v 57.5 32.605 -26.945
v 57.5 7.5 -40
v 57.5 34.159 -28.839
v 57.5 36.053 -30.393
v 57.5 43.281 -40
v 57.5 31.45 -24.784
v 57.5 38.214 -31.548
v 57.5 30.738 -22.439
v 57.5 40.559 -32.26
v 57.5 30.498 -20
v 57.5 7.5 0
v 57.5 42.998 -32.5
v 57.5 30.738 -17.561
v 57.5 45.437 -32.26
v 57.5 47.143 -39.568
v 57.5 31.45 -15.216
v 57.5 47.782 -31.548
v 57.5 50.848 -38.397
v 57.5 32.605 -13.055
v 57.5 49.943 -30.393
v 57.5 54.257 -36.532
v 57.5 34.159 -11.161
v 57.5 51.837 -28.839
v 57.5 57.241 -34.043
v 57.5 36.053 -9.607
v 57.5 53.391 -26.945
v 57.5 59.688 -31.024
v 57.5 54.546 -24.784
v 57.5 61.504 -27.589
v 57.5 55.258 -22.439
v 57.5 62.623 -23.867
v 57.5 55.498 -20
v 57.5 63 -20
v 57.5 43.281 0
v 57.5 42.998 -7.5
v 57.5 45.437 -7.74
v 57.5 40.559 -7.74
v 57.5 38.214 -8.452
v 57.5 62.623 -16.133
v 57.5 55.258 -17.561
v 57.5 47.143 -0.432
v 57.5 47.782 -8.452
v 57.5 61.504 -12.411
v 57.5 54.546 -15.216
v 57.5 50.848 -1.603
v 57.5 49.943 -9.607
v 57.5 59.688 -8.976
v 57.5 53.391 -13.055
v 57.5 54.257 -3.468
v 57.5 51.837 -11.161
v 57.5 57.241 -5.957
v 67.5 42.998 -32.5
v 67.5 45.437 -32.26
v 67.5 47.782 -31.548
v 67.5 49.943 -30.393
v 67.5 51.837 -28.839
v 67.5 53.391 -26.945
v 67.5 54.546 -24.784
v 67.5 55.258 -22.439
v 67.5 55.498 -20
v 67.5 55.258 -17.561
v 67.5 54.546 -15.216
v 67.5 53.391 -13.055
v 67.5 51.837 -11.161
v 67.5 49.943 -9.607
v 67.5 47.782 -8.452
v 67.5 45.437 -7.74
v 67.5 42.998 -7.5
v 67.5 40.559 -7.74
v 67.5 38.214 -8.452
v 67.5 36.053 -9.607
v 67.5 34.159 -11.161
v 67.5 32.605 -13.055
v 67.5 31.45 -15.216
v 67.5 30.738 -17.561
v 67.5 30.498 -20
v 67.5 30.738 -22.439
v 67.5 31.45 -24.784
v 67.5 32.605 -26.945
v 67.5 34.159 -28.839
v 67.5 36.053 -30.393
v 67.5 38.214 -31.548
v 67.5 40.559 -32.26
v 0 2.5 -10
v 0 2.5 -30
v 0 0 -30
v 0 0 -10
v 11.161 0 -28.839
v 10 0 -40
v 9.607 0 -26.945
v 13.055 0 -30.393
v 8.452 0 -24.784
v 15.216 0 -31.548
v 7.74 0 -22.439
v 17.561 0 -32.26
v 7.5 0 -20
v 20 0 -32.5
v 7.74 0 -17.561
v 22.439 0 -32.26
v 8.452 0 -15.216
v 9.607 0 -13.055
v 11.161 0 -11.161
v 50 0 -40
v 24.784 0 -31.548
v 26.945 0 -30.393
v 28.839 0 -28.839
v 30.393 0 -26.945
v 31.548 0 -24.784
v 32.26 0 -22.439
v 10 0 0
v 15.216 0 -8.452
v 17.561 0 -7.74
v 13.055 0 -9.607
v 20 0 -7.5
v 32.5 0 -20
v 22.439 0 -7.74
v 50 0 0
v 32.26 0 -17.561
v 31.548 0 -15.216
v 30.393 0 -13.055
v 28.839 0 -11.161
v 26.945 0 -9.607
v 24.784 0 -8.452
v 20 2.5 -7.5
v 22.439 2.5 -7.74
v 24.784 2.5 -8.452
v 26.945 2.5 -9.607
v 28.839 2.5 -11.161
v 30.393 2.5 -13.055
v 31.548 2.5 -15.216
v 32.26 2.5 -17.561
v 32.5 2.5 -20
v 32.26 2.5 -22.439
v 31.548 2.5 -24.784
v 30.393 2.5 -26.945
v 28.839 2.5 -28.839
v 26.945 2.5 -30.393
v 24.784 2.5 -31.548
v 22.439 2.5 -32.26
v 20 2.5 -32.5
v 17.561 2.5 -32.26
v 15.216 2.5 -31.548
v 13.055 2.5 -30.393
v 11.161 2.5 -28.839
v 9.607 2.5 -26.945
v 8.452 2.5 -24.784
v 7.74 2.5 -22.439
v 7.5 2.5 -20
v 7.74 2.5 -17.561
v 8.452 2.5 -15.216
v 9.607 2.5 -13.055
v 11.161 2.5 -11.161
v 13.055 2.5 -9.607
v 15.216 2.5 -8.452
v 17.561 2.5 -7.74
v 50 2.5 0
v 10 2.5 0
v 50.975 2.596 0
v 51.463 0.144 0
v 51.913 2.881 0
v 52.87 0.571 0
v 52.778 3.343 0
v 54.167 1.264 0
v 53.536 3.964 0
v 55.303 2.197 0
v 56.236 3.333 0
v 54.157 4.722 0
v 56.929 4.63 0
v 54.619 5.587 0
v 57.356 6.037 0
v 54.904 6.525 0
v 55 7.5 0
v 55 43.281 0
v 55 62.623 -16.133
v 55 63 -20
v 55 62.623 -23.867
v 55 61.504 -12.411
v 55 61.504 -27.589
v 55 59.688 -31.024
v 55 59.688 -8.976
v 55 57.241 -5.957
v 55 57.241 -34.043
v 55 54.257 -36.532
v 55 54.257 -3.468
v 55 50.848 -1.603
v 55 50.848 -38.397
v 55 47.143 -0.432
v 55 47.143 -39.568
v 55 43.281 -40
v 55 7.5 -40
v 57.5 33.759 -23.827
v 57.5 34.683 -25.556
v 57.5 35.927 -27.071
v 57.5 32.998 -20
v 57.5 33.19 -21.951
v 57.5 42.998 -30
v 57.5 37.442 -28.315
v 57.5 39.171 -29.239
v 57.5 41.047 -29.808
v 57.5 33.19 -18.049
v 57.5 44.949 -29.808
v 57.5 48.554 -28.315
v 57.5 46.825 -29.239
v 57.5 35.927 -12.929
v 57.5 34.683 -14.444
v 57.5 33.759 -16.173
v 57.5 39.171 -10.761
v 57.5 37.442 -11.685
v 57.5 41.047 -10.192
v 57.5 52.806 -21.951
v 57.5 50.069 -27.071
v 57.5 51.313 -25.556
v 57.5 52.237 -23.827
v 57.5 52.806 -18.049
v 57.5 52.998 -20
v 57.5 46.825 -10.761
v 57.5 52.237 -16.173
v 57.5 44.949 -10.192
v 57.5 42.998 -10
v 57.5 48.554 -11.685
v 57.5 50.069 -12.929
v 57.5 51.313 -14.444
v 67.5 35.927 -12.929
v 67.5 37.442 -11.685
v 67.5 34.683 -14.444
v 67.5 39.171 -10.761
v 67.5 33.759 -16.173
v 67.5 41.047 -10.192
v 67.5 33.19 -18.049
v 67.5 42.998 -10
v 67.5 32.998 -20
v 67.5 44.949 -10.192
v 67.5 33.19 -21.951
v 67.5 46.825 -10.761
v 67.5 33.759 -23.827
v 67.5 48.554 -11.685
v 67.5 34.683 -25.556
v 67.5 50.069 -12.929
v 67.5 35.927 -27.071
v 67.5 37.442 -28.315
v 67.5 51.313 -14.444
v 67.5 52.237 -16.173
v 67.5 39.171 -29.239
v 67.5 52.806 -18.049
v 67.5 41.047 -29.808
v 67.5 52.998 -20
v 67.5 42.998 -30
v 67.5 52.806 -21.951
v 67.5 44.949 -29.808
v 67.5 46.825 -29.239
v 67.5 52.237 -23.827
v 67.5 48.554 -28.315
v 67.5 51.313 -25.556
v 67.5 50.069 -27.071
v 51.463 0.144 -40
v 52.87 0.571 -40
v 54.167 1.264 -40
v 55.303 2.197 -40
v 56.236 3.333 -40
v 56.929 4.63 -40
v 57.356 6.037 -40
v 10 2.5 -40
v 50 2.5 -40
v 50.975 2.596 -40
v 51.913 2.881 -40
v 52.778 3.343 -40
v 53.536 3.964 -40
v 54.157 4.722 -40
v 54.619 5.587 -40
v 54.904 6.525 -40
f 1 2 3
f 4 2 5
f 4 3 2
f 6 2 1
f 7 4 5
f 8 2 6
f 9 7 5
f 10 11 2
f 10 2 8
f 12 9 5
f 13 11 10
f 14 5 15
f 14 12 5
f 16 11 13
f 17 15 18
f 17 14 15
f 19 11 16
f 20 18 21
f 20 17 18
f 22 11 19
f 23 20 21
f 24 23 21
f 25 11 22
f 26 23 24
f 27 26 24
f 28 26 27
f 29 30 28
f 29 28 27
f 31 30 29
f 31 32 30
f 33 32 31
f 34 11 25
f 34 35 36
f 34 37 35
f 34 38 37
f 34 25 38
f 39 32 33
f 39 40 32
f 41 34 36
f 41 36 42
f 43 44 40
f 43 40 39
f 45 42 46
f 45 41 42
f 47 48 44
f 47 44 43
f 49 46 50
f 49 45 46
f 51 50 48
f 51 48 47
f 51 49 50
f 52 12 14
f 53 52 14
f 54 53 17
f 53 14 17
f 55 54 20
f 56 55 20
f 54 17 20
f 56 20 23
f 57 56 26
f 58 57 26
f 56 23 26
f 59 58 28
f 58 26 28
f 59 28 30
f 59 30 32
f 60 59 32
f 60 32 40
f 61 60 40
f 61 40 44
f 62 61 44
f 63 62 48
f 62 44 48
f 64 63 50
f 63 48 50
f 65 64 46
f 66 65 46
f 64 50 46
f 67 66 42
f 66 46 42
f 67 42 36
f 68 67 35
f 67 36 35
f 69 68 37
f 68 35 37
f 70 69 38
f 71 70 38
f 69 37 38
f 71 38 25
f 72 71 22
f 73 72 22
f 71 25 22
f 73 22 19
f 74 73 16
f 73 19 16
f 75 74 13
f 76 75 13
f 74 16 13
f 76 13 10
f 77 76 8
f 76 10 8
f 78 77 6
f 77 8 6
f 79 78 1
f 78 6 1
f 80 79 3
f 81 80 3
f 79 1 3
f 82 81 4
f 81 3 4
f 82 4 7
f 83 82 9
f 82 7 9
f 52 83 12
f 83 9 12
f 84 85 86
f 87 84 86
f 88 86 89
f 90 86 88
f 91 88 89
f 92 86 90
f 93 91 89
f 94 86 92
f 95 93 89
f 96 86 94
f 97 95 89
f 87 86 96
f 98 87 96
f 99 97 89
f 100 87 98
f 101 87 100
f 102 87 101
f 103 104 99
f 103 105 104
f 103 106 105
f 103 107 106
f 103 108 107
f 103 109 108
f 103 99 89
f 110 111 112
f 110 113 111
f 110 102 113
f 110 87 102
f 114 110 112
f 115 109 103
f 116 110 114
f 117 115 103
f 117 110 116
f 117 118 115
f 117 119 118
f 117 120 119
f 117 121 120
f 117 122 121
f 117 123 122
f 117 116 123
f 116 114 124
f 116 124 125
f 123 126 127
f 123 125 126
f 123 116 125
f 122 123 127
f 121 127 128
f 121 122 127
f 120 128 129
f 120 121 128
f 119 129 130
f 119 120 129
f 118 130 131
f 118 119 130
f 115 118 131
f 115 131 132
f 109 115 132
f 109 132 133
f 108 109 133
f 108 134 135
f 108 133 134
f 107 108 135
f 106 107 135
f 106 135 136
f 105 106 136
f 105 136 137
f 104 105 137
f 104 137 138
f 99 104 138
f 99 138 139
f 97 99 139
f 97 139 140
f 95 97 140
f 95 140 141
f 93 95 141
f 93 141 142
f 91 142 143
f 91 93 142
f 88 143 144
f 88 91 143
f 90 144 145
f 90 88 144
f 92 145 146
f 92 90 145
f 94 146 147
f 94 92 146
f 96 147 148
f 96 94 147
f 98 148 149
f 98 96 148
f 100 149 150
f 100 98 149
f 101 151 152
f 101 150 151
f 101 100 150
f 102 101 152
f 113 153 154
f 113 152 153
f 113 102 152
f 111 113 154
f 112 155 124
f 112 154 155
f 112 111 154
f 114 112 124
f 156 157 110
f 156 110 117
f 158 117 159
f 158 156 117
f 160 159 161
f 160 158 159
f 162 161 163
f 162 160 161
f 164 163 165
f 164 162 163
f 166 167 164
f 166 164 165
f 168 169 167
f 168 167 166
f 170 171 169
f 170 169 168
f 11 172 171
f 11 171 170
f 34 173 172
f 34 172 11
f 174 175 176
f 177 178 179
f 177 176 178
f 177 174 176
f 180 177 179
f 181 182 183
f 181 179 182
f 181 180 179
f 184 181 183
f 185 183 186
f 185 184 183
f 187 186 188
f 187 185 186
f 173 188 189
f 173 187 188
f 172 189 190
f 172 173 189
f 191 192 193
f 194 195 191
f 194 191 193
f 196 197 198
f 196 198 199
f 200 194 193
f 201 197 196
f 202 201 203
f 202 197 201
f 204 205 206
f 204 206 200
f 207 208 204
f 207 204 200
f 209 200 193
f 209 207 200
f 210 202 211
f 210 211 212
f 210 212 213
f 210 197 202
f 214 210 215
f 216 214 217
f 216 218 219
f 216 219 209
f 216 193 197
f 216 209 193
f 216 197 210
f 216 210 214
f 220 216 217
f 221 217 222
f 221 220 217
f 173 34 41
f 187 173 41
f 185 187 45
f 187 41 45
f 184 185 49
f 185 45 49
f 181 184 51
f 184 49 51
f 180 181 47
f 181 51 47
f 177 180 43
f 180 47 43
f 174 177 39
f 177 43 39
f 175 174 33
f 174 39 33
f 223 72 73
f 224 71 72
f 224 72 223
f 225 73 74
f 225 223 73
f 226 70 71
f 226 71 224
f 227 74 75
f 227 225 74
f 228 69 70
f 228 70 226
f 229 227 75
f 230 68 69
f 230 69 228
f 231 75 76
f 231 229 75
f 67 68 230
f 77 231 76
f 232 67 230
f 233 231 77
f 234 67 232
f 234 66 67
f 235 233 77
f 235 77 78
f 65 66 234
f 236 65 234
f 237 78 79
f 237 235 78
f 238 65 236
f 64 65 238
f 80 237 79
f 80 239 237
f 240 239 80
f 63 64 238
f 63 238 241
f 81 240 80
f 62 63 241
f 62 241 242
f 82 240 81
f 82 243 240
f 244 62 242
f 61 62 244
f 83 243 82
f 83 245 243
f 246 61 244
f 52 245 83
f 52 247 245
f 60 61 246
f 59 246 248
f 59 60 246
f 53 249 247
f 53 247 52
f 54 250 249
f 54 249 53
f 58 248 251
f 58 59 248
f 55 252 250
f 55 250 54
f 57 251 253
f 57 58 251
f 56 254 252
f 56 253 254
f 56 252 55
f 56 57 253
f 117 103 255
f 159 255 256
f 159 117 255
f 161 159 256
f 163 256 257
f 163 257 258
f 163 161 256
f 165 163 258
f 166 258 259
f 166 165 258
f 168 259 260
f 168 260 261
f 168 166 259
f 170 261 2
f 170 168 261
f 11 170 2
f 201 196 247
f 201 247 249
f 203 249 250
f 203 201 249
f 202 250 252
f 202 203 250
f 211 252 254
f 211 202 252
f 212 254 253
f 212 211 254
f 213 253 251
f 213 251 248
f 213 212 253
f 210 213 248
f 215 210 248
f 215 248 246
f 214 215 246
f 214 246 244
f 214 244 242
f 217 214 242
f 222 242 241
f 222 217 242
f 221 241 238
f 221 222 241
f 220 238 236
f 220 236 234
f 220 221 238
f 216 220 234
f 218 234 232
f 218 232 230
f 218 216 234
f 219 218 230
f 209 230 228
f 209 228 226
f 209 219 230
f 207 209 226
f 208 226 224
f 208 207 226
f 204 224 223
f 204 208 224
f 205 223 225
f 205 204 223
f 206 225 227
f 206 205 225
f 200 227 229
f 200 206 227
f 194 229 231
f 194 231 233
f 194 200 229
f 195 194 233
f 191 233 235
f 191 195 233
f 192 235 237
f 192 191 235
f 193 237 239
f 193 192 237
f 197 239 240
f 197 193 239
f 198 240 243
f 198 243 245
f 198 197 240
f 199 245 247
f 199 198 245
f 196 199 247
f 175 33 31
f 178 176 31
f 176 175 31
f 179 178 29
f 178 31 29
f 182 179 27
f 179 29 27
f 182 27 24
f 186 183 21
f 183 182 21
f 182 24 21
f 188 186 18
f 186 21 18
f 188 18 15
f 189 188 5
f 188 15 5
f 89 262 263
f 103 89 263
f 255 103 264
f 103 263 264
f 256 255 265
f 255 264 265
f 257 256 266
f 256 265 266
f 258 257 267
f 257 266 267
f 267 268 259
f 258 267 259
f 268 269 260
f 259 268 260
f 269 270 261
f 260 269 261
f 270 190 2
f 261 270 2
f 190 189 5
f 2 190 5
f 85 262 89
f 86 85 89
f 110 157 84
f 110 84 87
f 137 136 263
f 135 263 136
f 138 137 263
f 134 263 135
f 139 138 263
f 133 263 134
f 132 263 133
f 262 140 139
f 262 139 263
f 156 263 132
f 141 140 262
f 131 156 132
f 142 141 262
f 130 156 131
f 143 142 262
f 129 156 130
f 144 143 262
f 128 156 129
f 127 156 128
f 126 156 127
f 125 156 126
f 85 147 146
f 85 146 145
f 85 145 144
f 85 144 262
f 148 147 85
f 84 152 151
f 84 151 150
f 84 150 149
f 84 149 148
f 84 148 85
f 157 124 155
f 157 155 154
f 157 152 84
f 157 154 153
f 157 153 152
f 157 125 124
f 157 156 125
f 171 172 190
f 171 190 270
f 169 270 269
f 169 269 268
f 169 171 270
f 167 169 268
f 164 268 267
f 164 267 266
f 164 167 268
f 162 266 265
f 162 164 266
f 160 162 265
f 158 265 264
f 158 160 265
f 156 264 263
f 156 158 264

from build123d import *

# Parameters (mm, degrees)
BOSS_EXTRUDE1_DEPTH     = 40
CUT_EXTRUDE2_DEPTH      = 95.20854526
SKETCH2_4_R             = 12.5
SKETCH2_4_R_2           = 10
BOSS_EXTRUDE2_DEPTH     = 10
CHAMFER1_SIZE           = 10
CUT_EXTRUDE3_DEPTH      = 100.078251902
CUT_EXTRUDE3_DEPTH_BACK = 100.078251902
SKETCH3_R               = 12.5


with BuildPart() as part:
    # Sketch1 → Boss-Extrude1 (new body)
    with BuildSketch(Plane.XY):
        with BuildLine():
            Line((0, 0), (50, 0))
            ThreePointArc((50, 0), (55.303300859, 2.196699141), (57.5, 7.5))
            Line((57.5, 7.5), (57.5, 63))
            Line((57.5, 63), (55, 63))
            Line((55, 63), (55, 7.5))
            ThreePointArc((55, 7.5), (53.535533906, 3.964466094), (50, 2.5))
            Line((50, 2.5), (0, 2.5))
            Line((0, 2.5), (0, 0))
        make_face()
    extrude(amount=-BOSS_EXTRUDE1_DEPTH)

    # Sketch2 → Cut-Extrude2 (cut, through all)
    with BuildSketch(Plane(origin=(57.5, 0, 0), x_dir=(0, 0, -1), z_dir=(1, 0, 0))):
        with BuildLine():
            Line((0, 63), (0, 43.281023868))
            ThreePointArc((0, 43.281023868), (5.956869832, 57.241262542), (20, 63))
            Line((20, 63), (0, 63))
        make_face()
        with BuildLine():
            Line((40, 63), (20, 63))
            ThreePointArc((20, 63), (34.043130168, 57.241262542), (40, 43.281023868))
            Line((40, 43.281023868), (40, 63))
        make_face()
    extrude(amount=-CUT_EXTRUDE2_DEPTH, mode=Mode.SUBTRACT)

    # Sketch2<4> → Boss-Extrude2 (add)
    with BuildSketch(Plane(origin=(57.5, 0, 0), x_dir=(0, 0, -1), z_dir=(1, 0, 0))):
        with Locations((20, 42.997997502)):
            Circle(SKETCH2_4_R)
        with Locations((20, 42.997997502)):
            Circle(SKETCH2_4_R_2, mode=Mode.SUBTRACT)
    extrude(amount=BOSS_EXTRUDE2_DEPTH)

    # Chamfer1
    chamfer1_edges = [part.edges().sort_by_distance(p)[0] for p in [
        (0, 1.25, -40),
        (0, 1.25, 0),
    ]]
    chamfer(chamfer1_edges, length=CHAMFER1_SIZE)

    # Sketch3 → Cut-Extrude3 (cut, two sides: drawn at the far end of the back side and taken through both)
    with BuildSketch(Plane(origin=(0, 2.5, 0), x_dir=(1, 0, 0), z_dir=(0, 1, 0)).offset(-CUT_EXTRUDE3_DEPTH_BACK)):
        with Locations((20, 20)):
            Circle(SKETCH3_R)
    extrude(amount=CUT_EXTRUDE3_DEPTH + CUT_EXTRUDE3_DEPTH_BACK, mode=Mode.SUBTRACT)


solid = part.part
